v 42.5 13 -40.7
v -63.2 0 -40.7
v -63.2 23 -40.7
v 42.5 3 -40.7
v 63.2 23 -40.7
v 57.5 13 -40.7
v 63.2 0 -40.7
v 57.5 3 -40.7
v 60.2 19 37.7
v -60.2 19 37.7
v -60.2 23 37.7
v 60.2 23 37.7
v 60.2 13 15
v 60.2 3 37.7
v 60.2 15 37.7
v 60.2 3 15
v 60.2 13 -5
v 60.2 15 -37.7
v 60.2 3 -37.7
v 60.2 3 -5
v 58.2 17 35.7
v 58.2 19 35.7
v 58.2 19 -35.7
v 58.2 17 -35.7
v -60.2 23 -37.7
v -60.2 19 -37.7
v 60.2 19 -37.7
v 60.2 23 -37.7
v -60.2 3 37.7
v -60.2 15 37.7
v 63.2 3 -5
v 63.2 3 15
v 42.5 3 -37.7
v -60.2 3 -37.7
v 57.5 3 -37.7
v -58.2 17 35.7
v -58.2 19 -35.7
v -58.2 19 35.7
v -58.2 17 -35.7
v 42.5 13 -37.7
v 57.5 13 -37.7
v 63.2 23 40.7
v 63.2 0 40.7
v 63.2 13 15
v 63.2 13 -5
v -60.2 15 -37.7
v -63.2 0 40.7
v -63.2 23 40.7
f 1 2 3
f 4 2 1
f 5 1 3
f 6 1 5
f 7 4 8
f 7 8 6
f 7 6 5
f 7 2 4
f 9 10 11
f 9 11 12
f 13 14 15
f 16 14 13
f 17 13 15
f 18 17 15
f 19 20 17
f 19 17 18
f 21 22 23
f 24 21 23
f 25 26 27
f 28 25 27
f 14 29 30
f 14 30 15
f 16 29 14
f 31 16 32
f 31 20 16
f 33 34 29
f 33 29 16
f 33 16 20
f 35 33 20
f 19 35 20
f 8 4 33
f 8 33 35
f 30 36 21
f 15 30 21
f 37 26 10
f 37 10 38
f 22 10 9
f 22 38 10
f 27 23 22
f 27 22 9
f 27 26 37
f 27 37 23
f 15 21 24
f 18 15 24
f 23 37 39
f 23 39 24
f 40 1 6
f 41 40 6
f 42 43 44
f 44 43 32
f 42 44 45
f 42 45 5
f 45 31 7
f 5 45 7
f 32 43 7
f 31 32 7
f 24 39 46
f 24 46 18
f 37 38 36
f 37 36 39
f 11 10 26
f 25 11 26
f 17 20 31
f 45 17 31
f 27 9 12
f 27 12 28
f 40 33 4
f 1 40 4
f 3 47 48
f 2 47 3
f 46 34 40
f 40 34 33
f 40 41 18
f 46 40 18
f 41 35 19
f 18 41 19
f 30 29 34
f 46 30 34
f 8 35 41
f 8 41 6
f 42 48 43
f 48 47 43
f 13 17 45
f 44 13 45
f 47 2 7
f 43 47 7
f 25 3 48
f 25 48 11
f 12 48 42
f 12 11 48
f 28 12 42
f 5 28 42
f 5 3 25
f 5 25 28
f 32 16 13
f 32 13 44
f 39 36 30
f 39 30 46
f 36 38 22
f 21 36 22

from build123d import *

# Parameters (mm, degrees)
BOSS_EXTRUDE1_DEPTH = 3
SKETCH2_W           = 126.4
SKETCH2_H           = 81.4
SKETCH2_W_2         = 120.4
SKETCH2_H_2         = 75.4
BOSS_EXTRUDE2_DEPTH = 20
SKETCH4_W           = 7.2
SKETCH4_H           = 20
CUT_EXTRUDE1_DEPTH  = 10
SKETCH5_W           = 15
SKETCH5_H           = 12.33485255
CUT_EXTRUDE2_DEPTH  = 10
BOSS_EXTRUDE3_START = -4
SKETCH6_W           = 120.4
SKETCH6_H           = 75.4
SKETCH6_W_2         = 116.4
SKETCH6_H_2         = 71.4
BOSS_EXTRUDE3_DEPTH = 2
CHAMFER1_SIZE       = 2


with BuildPart() as part:
    # Sketch1 → Boss-Extrude1 (new body)
    with BuildSketch(Plane(origin=(0, 0, 0), x_dir=(1, 0, 0), z_dir=(0, 1, 0))):
        Polygon((63.2, 40.7), (-63.2, 40.7), (-63.2, -40.7), (63.2, -40.7), (63.2, -15), (63.2, 5), align=None)
    extrude(amount=BOSS_EXTRUDE1_DEPTH)

    # Sketch2 → Boss-Extrude2 (add)
    with BuildSketch(Plane(origin=(0, 3, 0), x_dir=(1, 0, 0), z_dir=(0, 1, 0))):
        Rectangle(SKETCH2_W, SKETCH2_H)
        Rectangle(SKETCH2_W_2, SKETCH2_H_2, mode=Mode.SUBTRACT)
    extrude(amount=BOSS_EXTRUDE2_DEPTH)

    # Sketch4 → Cut-Extrude1 (cut)
    with BuildSketch(Plane(origin=(0, 3, 0), x_dir=(1, 0, 0), z_dir=(0, 1, 0))):
        with Locations((59.6, -5)):
            Rectangle(SKETCH4_W, SKETCH4_H)
    extrude(amount=CUT_EXTRUDE1_DEPTH, mode=Mode.SUBTRACT)

    # Sketch5 → Cut-Extrude2 (cut)
    with BuildSketch(Plane(origin=(0, 3, 0), x_dir=(1, 0, 0), z_dir=(0, 1, 0))):
        with Locations((50, 37.5)):
            Rectangle(SKETCH5_W, SKETCH5_H)
    extrude(amount=CUT_EXTRUDE2_DEPTH, mode=Mode.SUBTRACT)

    # Sketch6 → Boss-Extrude3 (add)
    with BuildSketch(Plane(origin=(0, 23, 0), x_dir=(1, 0, 0), z_dir=(0, 1, 0)).offset(BOSS_EXTRUDE3_START)):
        Rectangle(SKETCH6_W, SKETCH6_H)
        Rectangle(SKETCH6_W_2, SKETCH6_H_2, mode=Mode.SUBTRACT)
    extrude(amount=-BOSS_EXTRUDE3_DEPTH)

    # Chamfer1
    chamfer1_edges = [part.edges().sort_by_distance(p)[0] for p in [
        (0, 17, 37.7),
        (-60.2, 17, 0),
        (0, 17, -37.7),
        (60.2, 17, 0),
    ]]
    chamfer(chamfer1_edges, length=CHAMFER1_SIZE - 0.0001)  # a hair under: the kernel refuses the full size


solid = part.part
